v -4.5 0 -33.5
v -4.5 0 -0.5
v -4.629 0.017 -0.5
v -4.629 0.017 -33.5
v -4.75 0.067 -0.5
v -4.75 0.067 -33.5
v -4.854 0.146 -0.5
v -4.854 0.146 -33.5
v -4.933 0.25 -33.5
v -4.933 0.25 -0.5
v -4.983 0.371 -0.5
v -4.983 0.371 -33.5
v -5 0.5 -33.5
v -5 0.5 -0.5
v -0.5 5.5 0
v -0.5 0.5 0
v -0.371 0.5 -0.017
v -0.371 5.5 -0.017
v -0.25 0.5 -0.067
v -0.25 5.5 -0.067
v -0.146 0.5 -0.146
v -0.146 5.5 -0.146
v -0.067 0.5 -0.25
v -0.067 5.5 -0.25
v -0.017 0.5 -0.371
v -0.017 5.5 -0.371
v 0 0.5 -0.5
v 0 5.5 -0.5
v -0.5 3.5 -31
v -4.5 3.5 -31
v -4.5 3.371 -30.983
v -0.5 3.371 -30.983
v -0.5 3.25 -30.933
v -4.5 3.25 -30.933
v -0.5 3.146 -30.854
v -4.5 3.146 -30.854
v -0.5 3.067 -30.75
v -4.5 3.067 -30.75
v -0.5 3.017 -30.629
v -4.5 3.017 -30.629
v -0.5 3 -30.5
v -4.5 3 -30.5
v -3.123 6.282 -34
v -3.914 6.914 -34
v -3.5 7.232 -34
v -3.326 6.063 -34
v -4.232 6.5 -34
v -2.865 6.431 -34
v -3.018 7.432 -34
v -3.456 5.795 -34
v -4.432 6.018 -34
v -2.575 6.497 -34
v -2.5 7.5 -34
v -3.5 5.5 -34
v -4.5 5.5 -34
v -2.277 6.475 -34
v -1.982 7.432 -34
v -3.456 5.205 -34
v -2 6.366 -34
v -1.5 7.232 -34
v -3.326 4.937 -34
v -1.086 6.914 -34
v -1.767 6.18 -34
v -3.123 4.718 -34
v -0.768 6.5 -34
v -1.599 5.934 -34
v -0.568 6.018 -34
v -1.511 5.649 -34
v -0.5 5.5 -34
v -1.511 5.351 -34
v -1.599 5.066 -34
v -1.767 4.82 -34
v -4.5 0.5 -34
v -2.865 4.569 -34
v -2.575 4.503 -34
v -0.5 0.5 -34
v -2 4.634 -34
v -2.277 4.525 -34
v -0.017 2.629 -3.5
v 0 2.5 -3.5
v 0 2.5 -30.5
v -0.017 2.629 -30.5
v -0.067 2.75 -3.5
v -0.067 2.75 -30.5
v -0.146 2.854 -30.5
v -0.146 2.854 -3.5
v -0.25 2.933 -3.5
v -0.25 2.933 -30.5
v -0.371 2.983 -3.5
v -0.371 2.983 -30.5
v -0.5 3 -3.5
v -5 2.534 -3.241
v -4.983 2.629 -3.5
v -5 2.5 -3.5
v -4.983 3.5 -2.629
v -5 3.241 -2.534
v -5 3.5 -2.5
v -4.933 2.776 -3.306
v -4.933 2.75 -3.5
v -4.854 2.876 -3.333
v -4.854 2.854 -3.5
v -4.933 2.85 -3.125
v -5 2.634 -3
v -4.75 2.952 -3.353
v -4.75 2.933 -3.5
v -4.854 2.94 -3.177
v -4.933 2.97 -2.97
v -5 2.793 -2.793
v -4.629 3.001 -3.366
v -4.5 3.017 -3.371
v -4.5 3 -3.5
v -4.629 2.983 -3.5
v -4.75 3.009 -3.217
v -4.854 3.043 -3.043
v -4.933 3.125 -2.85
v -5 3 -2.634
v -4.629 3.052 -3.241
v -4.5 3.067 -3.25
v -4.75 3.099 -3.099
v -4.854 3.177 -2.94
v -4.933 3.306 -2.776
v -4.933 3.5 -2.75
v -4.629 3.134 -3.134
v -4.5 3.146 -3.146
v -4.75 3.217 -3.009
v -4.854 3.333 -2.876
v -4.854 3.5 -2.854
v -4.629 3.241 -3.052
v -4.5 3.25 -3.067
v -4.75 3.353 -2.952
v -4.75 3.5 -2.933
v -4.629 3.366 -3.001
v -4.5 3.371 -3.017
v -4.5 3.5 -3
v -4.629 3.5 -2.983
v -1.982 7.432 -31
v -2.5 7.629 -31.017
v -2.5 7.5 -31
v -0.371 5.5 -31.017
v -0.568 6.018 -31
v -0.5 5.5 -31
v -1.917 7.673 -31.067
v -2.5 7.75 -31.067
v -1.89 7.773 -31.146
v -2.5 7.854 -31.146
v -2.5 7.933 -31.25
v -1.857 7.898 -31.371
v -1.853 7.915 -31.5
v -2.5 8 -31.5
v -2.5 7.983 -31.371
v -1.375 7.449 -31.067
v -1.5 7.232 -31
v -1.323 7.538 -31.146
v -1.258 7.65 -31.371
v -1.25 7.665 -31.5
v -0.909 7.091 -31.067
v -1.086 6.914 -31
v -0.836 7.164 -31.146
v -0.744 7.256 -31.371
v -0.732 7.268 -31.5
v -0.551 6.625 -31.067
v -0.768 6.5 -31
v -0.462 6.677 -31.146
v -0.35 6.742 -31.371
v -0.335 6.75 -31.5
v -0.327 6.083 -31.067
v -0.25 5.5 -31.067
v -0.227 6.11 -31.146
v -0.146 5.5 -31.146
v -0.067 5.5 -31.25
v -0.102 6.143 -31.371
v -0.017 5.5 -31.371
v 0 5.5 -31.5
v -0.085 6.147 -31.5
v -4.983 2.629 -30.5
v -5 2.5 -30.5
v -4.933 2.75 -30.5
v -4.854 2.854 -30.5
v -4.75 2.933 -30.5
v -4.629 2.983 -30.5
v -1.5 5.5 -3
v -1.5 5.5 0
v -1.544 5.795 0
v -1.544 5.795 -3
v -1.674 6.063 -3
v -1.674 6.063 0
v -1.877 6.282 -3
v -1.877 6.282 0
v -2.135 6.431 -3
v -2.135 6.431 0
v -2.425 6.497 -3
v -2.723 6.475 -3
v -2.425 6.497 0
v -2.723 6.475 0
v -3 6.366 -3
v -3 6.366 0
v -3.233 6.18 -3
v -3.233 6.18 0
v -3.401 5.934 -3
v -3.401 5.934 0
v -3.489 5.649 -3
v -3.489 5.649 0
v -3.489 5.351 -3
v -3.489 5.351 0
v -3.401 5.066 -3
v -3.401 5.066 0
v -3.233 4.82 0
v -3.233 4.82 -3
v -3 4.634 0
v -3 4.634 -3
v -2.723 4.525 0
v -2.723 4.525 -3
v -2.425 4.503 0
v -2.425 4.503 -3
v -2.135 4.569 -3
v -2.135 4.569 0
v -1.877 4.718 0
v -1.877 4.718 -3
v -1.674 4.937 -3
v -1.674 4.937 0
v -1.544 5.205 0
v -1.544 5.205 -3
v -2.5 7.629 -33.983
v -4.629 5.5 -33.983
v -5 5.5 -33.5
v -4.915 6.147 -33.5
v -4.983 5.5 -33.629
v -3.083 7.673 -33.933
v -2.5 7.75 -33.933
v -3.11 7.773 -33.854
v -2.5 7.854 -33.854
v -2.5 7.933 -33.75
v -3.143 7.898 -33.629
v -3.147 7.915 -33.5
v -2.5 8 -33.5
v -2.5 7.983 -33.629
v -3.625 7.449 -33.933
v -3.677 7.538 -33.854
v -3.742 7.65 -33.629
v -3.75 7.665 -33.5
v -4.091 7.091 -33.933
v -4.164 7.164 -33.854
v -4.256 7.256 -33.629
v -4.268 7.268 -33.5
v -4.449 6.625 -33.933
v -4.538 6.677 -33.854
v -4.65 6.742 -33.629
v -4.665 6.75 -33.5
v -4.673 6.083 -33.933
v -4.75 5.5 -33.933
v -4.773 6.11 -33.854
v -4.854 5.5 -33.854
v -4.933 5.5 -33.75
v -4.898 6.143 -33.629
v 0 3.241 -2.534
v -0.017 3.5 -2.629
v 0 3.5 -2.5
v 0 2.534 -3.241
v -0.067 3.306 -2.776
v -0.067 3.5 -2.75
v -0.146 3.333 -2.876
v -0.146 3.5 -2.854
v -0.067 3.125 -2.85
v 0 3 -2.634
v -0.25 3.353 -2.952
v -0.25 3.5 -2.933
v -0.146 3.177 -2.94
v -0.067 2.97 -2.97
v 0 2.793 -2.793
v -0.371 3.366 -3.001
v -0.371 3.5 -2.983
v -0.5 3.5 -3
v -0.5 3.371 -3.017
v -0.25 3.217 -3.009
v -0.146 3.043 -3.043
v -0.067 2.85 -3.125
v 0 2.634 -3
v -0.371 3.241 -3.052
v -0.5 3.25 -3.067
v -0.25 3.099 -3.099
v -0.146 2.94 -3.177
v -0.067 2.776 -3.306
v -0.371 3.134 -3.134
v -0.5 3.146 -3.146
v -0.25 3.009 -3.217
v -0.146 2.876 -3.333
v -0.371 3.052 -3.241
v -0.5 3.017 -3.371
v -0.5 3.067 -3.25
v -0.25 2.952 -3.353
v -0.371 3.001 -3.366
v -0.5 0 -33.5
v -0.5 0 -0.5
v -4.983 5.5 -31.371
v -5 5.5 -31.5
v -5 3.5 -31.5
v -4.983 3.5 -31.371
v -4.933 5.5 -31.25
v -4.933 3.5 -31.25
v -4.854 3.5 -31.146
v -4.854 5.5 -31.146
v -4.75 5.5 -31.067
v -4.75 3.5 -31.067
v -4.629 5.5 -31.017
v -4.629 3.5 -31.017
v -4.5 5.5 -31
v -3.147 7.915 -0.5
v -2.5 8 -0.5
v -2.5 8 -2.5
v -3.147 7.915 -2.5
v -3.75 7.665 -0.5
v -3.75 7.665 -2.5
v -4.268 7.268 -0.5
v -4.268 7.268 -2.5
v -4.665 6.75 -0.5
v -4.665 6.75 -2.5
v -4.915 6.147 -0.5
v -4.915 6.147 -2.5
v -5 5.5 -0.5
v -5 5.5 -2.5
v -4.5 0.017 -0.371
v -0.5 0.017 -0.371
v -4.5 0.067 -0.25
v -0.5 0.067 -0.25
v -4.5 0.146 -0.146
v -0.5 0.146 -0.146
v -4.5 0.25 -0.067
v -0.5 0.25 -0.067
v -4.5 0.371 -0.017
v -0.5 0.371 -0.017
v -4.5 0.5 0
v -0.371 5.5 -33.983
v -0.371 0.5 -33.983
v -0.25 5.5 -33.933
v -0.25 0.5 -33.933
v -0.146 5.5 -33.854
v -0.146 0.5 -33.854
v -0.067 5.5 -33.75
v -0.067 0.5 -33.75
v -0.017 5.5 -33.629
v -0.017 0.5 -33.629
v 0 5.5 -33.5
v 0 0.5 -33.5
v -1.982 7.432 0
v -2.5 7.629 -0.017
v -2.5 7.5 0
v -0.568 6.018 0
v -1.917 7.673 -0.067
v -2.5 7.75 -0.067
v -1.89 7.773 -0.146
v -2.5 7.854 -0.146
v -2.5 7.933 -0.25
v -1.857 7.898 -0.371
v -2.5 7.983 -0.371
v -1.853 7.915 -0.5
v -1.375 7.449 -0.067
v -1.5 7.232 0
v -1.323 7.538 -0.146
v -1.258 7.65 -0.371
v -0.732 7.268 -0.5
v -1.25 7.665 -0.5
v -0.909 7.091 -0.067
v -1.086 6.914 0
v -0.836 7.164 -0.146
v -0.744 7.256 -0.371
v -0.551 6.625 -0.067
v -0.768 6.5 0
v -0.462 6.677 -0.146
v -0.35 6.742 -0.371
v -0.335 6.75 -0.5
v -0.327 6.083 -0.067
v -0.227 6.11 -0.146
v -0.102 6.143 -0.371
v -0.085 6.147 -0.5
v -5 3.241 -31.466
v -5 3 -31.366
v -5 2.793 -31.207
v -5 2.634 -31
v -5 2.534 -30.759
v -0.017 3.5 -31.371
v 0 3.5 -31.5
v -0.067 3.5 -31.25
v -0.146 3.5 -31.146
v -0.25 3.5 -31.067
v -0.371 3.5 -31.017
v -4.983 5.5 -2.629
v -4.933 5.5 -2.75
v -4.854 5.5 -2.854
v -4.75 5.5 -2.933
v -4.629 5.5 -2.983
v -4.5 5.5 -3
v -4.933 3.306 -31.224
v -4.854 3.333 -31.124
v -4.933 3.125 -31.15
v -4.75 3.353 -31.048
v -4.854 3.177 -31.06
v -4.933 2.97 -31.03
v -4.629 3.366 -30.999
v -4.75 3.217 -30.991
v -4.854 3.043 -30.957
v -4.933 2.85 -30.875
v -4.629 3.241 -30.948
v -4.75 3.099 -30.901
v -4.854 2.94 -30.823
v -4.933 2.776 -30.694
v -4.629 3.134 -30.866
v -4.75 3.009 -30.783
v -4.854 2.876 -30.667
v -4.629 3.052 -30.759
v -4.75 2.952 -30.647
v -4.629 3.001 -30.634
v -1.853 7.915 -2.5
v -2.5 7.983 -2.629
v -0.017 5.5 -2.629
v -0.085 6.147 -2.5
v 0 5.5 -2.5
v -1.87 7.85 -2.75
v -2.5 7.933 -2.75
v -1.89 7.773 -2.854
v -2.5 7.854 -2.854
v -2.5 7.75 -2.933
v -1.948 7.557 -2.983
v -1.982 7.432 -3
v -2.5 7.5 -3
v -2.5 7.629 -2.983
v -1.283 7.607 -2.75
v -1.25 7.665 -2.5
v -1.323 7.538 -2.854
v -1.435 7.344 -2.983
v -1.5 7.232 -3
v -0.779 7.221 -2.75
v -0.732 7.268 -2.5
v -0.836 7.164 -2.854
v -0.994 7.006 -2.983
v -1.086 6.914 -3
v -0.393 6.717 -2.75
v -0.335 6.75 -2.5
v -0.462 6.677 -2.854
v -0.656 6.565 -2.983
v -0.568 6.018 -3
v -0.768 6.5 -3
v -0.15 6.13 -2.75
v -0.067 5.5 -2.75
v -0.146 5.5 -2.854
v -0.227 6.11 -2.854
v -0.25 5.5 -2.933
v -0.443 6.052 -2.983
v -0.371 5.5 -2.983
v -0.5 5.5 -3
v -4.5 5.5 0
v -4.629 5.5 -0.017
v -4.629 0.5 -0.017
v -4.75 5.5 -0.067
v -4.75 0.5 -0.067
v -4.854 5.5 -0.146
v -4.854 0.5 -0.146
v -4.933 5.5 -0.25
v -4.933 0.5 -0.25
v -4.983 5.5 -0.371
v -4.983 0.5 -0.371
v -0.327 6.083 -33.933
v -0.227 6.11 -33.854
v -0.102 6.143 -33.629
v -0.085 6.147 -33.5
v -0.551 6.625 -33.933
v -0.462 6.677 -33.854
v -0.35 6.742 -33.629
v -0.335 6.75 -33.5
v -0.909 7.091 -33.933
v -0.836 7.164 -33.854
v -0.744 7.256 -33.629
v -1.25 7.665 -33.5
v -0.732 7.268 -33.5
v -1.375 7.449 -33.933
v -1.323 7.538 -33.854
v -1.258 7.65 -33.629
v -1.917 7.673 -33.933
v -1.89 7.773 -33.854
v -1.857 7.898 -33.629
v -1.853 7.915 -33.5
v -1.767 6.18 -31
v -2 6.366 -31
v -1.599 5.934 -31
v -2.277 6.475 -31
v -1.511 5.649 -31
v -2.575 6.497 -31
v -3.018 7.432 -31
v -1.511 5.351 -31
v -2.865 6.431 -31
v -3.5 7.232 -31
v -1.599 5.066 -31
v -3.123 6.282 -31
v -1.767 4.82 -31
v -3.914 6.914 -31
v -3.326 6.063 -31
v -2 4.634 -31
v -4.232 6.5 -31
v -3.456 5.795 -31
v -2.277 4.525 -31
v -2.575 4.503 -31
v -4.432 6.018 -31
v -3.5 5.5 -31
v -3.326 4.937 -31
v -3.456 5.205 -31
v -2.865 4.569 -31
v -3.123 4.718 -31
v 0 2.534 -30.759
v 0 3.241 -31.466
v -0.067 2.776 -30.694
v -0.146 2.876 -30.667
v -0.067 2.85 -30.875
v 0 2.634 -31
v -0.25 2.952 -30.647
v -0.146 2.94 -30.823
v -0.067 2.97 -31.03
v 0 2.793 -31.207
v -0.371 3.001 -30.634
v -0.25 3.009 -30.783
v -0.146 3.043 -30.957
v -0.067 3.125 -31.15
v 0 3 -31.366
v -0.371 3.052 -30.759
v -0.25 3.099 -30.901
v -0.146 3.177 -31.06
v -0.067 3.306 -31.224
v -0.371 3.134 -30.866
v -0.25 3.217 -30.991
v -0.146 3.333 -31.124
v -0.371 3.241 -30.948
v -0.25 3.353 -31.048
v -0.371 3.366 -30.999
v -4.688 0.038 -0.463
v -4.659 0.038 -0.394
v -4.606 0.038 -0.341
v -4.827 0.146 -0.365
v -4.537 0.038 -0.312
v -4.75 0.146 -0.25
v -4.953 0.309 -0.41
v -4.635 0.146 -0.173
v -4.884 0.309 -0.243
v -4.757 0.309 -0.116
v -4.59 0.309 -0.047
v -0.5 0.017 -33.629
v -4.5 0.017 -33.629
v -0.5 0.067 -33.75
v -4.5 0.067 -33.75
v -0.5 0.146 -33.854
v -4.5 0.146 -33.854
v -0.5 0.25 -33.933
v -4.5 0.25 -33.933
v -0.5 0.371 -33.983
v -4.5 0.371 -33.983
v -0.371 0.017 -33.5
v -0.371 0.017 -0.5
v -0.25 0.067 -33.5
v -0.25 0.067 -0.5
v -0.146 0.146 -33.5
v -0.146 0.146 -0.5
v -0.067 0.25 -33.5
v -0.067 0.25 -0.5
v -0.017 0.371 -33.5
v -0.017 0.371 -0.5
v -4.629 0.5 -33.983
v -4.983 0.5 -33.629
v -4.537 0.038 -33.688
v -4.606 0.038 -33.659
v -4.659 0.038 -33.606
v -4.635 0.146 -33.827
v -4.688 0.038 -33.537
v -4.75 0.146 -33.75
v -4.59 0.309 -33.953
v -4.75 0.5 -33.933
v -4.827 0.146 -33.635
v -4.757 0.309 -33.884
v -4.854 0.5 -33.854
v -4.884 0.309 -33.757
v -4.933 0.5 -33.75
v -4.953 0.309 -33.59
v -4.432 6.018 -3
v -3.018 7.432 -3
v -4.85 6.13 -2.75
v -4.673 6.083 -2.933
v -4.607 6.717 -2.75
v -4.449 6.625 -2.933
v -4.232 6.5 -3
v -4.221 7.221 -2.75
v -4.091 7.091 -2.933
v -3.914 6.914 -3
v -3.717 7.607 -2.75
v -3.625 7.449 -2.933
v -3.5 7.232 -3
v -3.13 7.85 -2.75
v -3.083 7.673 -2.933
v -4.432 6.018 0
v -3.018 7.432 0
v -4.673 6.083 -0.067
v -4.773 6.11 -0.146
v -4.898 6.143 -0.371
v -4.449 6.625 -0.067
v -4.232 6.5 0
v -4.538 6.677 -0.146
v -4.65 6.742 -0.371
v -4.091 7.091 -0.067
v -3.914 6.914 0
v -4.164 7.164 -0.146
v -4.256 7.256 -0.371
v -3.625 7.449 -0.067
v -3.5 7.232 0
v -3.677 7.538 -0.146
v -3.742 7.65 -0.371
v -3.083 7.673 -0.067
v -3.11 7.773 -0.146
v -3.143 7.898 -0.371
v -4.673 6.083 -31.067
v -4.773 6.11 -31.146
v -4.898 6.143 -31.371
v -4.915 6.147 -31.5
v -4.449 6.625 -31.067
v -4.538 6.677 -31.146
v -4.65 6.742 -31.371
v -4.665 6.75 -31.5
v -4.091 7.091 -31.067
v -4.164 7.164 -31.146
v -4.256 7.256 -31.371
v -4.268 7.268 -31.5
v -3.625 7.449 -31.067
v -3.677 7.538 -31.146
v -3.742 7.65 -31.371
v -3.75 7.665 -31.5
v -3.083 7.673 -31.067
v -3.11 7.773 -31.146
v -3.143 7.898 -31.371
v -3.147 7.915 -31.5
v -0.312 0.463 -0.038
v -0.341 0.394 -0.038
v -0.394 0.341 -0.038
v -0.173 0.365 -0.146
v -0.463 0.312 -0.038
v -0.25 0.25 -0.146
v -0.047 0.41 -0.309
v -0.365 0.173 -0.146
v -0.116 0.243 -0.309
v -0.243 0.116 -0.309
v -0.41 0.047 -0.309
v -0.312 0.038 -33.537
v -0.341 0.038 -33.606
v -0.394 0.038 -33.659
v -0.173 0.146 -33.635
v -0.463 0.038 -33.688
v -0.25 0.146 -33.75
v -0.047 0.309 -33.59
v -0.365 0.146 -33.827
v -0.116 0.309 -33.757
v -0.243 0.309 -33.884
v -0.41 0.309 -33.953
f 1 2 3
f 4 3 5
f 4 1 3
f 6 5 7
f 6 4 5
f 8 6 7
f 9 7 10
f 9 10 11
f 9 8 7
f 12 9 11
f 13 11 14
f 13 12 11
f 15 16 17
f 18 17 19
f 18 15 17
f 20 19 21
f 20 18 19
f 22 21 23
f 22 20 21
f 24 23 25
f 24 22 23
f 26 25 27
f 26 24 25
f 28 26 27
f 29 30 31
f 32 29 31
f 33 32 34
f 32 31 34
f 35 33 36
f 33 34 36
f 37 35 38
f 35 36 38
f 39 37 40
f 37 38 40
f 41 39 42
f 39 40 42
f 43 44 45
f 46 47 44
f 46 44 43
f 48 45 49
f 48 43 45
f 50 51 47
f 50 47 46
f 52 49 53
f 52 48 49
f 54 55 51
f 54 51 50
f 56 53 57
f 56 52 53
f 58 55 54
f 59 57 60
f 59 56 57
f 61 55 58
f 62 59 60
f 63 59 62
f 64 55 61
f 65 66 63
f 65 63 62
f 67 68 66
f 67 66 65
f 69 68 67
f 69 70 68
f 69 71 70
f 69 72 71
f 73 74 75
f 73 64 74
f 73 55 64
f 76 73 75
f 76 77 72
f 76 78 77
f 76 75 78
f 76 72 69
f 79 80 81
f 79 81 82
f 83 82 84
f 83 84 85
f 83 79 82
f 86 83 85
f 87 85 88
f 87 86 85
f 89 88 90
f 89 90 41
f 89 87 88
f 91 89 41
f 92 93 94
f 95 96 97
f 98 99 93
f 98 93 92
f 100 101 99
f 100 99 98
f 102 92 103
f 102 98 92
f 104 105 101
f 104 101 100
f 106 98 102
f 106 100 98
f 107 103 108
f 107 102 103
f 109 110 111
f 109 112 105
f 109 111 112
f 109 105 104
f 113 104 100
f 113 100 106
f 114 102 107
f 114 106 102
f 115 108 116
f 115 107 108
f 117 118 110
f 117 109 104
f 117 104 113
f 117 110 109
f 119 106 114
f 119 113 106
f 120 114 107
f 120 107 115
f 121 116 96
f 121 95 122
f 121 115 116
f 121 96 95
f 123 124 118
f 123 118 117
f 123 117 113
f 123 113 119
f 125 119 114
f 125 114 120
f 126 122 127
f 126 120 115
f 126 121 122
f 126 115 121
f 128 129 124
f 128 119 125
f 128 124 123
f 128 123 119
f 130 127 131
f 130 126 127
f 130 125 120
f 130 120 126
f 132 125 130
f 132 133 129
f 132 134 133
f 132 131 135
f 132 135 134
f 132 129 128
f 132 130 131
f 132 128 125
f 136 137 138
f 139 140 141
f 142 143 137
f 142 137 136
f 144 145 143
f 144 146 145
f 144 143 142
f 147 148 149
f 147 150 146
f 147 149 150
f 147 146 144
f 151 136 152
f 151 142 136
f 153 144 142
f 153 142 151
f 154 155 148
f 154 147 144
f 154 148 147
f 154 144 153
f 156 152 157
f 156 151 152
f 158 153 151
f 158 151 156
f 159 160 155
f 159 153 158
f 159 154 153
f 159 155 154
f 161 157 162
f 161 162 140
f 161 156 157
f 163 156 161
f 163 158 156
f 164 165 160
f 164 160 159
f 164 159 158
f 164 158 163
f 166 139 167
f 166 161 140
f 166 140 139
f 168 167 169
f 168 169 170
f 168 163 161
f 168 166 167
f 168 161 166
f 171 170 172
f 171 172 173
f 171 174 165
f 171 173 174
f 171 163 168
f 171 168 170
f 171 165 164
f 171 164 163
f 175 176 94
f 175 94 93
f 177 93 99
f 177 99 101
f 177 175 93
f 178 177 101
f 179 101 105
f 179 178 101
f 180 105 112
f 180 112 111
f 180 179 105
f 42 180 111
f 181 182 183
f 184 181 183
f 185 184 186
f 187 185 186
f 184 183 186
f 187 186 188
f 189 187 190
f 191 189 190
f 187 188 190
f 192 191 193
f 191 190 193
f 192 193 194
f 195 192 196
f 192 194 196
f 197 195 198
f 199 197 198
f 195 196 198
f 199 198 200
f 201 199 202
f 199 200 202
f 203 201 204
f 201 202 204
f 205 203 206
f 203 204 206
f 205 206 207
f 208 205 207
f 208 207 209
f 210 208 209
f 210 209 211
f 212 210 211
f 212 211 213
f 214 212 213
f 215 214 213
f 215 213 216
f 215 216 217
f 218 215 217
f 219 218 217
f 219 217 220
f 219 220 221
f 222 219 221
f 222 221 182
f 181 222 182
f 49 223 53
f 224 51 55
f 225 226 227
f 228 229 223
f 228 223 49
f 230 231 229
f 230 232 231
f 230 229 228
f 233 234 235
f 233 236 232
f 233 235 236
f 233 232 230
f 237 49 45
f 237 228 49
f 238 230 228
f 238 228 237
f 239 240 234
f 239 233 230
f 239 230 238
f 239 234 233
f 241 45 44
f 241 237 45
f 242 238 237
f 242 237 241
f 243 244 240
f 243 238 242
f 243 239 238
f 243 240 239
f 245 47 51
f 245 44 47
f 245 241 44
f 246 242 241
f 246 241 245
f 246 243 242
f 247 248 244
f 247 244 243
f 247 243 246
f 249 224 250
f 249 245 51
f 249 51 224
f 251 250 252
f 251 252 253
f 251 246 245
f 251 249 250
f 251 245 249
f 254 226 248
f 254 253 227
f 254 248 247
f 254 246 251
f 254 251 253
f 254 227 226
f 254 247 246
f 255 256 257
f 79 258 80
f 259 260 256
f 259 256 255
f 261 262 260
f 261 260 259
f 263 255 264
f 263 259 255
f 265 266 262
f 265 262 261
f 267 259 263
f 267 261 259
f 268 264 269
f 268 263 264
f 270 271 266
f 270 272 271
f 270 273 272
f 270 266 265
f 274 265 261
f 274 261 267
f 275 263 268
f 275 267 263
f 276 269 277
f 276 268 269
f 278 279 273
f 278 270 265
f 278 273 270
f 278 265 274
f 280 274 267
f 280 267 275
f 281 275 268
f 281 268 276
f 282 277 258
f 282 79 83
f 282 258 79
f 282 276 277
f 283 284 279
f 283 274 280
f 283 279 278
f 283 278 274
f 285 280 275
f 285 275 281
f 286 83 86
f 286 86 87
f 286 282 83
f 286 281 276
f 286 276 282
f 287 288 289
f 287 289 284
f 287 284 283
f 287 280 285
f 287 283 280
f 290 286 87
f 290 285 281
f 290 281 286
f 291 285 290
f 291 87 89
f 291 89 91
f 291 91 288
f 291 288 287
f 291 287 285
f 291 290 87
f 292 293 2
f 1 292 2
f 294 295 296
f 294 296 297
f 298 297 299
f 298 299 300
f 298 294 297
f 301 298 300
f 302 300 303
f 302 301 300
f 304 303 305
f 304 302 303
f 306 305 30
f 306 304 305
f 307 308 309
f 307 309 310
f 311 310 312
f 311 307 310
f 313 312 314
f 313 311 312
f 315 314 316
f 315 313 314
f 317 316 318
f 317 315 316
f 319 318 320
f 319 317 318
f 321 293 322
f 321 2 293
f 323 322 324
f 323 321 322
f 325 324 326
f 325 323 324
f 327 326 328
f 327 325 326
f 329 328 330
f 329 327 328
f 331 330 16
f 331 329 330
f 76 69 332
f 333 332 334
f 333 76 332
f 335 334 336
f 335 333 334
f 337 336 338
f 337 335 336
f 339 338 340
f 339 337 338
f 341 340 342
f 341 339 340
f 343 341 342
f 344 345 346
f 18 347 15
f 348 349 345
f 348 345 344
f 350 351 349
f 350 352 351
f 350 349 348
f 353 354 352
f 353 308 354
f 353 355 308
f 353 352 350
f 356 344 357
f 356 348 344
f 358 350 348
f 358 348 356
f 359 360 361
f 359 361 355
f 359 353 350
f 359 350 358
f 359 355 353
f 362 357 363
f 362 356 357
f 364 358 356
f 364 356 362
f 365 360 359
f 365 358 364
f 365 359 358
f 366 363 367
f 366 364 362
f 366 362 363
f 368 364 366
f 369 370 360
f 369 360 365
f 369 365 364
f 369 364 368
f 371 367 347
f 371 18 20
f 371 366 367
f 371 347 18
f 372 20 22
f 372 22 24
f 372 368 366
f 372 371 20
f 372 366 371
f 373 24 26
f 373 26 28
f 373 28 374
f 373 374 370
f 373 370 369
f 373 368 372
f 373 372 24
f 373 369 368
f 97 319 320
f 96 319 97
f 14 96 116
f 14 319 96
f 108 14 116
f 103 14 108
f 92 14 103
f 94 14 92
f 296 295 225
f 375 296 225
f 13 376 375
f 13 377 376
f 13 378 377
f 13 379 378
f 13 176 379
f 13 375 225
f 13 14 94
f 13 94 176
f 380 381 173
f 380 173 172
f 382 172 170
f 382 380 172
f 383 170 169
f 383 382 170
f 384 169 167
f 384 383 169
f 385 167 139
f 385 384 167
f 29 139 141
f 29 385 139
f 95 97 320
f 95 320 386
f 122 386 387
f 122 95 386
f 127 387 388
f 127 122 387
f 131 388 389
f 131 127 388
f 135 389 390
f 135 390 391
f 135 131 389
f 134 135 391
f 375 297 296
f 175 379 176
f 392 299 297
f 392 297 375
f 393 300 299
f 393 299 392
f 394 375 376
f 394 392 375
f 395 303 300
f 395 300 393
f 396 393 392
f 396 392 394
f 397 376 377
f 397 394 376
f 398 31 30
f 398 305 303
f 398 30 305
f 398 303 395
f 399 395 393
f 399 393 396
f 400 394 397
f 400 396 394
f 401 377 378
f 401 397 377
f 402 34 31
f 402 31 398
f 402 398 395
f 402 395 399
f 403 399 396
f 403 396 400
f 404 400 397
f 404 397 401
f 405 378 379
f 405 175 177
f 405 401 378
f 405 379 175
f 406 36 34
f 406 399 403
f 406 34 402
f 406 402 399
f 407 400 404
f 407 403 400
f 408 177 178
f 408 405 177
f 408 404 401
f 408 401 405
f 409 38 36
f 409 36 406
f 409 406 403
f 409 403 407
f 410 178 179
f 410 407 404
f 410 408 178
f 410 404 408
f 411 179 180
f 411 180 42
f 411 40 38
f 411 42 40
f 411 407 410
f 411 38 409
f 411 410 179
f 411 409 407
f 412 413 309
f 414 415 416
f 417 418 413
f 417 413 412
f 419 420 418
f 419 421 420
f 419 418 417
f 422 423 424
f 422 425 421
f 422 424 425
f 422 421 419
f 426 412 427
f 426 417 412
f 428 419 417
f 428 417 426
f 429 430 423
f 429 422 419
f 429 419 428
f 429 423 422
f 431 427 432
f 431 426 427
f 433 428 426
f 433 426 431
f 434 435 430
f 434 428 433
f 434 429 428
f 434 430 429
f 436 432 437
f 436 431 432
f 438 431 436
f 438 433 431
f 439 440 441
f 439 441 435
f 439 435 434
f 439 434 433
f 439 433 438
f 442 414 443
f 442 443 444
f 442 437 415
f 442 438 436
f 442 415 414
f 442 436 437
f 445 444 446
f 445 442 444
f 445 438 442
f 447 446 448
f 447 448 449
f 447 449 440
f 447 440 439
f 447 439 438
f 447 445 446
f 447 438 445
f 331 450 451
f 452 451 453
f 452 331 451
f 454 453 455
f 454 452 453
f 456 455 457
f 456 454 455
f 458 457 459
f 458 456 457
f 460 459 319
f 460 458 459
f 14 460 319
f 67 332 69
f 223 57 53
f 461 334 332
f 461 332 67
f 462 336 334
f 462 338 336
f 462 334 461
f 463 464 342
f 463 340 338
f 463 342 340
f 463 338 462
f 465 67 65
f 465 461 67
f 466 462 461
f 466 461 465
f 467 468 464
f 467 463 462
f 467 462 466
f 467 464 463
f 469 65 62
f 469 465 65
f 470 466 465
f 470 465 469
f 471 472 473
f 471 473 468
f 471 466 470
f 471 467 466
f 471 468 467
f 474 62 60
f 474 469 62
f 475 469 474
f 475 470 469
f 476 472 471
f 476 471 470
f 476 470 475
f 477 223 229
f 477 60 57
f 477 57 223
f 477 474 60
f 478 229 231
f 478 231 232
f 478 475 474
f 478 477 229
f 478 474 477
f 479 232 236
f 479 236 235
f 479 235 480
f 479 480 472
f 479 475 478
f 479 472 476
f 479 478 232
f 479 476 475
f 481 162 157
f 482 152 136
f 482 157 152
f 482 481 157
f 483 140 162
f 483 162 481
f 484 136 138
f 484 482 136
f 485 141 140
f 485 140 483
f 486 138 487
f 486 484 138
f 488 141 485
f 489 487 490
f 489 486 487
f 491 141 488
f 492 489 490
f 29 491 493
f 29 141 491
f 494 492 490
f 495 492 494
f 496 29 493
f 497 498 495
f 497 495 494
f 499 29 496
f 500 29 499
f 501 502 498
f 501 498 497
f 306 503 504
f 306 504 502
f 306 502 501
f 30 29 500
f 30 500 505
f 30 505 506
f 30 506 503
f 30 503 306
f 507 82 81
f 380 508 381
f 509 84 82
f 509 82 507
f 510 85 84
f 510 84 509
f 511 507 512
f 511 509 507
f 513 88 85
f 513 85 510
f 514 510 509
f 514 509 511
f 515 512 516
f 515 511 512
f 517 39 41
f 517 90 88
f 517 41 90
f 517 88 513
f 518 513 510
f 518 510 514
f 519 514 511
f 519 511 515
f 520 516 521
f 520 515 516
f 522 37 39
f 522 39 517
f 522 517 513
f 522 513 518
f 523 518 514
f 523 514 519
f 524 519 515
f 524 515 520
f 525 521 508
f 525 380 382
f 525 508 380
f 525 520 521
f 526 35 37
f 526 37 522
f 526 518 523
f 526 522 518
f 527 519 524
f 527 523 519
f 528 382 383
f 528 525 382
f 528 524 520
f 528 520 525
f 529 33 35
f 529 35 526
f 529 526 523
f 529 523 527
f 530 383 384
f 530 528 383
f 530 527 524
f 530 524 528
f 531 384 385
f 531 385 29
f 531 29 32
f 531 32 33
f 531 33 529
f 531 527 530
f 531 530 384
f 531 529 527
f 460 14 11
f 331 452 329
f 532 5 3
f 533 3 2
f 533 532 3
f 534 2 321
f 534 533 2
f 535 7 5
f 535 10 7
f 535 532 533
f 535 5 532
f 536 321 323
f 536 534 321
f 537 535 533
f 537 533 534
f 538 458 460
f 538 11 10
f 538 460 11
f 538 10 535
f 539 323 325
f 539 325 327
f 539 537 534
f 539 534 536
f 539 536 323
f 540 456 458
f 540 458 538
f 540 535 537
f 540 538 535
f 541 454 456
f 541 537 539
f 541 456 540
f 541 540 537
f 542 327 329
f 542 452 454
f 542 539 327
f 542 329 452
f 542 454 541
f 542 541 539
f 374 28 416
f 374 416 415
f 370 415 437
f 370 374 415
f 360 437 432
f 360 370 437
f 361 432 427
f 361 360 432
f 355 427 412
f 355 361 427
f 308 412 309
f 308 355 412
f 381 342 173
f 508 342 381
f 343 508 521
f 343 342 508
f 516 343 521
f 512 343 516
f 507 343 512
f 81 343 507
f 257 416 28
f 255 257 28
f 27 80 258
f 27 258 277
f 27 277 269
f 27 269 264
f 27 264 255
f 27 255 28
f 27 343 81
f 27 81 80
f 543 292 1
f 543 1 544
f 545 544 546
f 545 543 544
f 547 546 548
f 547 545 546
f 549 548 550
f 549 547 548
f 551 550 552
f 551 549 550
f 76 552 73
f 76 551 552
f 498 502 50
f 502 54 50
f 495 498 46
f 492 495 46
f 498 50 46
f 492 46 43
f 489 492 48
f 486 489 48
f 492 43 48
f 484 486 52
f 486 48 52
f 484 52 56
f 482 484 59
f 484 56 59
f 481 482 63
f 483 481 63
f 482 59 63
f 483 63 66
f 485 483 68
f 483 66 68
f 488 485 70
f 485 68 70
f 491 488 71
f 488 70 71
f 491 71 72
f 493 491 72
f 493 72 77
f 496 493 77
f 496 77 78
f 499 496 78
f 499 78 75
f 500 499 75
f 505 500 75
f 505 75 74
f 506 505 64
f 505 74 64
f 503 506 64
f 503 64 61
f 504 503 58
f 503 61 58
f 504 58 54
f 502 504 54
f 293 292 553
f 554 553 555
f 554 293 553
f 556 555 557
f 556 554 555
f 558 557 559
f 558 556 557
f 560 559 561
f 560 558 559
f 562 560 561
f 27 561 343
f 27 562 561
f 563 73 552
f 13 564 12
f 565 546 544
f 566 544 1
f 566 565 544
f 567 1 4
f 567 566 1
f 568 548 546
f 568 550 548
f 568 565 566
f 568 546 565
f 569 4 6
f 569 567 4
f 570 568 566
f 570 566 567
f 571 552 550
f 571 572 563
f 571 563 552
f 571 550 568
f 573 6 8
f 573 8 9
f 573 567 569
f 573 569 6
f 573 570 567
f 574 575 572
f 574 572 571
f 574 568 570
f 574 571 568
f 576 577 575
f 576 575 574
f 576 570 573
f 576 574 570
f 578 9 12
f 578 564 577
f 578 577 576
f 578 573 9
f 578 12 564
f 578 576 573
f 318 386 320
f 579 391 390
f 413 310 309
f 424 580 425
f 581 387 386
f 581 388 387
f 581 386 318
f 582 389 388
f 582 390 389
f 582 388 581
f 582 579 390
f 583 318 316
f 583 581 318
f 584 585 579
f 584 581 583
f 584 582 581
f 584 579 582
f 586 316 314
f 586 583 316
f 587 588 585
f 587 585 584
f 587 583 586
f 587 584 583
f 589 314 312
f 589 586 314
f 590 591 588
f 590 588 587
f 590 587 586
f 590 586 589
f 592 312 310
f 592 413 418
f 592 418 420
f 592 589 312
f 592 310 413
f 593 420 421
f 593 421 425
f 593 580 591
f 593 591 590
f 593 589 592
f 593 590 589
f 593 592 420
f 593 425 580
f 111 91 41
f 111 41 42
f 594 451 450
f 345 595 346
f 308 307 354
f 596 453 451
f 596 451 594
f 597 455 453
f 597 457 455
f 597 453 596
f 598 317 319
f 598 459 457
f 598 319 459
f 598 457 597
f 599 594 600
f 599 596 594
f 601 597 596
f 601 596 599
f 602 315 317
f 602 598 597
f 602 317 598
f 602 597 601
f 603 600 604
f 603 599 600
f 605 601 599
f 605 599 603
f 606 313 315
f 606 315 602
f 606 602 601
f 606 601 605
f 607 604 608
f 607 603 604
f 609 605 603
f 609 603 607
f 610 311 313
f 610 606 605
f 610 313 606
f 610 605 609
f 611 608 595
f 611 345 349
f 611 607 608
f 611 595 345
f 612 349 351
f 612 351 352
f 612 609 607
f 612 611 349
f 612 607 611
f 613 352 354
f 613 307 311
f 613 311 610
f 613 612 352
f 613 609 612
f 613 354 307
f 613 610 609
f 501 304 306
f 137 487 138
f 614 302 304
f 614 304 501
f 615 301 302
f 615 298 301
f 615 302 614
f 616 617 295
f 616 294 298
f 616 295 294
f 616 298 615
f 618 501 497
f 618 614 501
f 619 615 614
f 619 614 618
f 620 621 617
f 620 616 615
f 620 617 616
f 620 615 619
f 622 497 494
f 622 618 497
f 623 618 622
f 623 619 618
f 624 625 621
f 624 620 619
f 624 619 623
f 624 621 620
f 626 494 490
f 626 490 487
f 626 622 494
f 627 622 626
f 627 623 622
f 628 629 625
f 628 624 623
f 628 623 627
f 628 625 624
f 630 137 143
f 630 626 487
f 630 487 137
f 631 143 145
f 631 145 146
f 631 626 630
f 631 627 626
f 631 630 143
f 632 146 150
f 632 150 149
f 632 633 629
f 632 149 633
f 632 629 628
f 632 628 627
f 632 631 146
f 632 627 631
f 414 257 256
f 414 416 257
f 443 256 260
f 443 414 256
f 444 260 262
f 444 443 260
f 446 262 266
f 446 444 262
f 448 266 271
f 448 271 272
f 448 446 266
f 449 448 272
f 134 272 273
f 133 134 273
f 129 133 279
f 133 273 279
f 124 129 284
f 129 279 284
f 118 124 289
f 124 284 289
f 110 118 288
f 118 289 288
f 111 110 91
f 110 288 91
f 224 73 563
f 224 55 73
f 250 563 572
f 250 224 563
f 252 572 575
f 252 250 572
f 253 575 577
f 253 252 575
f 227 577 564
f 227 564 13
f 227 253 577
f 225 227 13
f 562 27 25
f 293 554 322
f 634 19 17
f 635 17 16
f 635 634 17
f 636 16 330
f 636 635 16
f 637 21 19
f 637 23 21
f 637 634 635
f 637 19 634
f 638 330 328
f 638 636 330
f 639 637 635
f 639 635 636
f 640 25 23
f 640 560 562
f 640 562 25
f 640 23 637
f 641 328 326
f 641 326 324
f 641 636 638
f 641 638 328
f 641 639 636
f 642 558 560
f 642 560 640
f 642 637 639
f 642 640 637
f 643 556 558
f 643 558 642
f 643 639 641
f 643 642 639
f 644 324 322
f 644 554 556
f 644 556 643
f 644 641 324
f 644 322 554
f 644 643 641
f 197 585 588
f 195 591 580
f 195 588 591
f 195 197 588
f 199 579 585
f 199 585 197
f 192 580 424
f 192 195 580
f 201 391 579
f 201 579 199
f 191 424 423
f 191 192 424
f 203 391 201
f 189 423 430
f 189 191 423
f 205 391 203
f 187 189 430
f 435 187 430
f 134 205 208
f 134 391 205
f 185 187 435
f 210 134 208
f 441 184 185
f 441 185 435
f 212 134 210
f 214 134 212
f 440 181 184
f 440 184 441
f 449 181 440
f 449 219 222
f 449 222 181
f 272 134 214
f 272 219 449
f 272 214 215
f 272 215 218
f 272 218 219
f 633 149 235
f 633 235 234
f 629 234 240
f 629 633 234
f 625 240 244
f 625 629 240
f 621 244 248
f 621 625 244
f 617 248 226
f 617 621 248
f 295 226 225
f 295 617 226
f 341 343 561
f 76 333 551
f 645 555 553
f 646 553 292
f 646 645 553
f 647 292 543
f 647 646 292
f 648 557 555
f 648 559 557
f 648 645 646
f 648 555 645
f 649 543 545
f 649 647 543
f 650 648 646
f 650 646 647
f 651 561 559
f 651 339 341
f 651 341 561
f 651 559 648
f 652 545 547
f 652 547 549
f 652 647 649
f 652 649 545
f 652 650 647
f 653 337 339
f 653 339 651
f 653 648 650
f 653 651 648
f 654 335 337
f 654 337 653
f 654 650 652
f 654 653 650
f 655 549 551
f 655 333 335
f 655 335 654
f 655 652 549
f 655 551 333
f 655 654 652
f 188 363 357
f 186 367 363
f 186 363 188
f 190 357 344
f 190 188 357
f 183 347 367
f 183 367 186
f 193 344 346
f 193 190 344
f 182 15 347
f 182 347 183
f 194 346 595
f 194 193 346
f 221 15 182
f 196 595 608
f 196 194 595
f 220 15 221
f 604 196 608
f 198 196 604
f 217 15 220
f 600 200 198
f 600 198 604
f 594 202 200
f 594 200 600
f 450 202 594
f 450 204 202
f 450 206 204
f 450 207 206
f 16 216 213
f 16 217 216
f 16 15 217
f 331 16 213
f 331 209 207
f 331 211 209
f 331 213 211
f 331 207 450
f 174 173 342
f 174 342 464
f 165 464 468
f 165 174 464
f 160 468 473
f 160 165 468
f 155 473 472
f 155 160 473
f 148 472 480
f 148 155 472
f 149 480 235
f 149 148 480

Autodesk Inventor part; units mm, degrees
ref_plane "YZ Plane" through (0, 0, 0) normal (1, 0, 0) x (0, 1, 0)
ref_plane "XZ Plane" through (0, 0, 0) normal (0, 1, 0) x (-1, 0, 0)
ref_plane "XY Plane" through (0, 0, 0) normal (0, 0, 1) x (1, 0, 0)
sketch "Sketch1" plane through (0, 0, 0) normal (0, 1, 0) x (-1, 0, 0)
  line L0 (0, 0) -> (5, 0)
  line L1 (5, 0) -> (5, -34)
  line L2 (5, -34) -> (0, -34)
  line L3 (0, -34) -> (0, 0)
  dimension "d0" = 5
  dimension "d1" = 34
extrude "Extrusion1" add sketch "Sketch1" along normal blind 3
sketch "Sketch2" plane through (0, 3, 0) normal (0, 1, 0) x (1, 0, 0)
  line L0 (-5, 0) -> (0, 0) projected
  line L1 (-5, 34) -> (-5, 0) projected
  line L2 (0, 0) -> (-5, 0)
  line L3 (-5, 0) -> (-5, 3)
  line L4 (-5, 3) -> (0, 3)
  line L5 (0, 3) -> (0, 0)
  line L6 (0, 34) -> (-5, 34) projected
  line L7 (-5, 34) -> (0, 34)
  line L8 (0, 34) -> (0, 31)
  line L9 (0, 31) -> (-5, 31)
  line L10 (-5, 31) -> (-5, 34)
  dimension "d4" = 3
  dimension "d5" = 5
  dimension "d6" = 3
extrude "Extrusion2" add sketch "Sketch2" along normal blind 5
fillet "Fillet1" radius 2.5 4 edges at (0, 8, -1.5) (-5, 8, -1.5) (-5, 8, -32.5) (0, 8, -32.5)
sketch "Sketch3" plane through (-5, 3, -31) normal (0, 0, 1) x (1, 0, 0)
  point P0 (5, -3)
sketch "Sketch4" plane through (-5, 0, 0) normal (0, 0, 1) x (1, 0, 0)
  circle A0 centre (2.5, 5.5) radius 1
  arc A1 (5, 5.5) -> (0, 5.5) centre (2.5, 5.5) ccw projected
  line L0 (5, 0) -> (5, 5.5) projected
  dimension "d10" = 2
  dimension "d11" = 0
  dimension "d12" = 2.5
sketch "Sketch5" plane through (0, 0, -34) normal (0, 0, -1) x (-1, 0, 0)
  circle A0 centre (2.5, 5.5) radius 1
  arc A1 (5, 5.5) -> (0, 5.5) centre (2.5, 5.5) ccw projected
  line L0 (5, 0) -> (5, 5.5) projected
  point P0 (0, 0)
  dimension "d13" = 2
  dimension "d14" = 0
  dimension "d15" = 2.5
extrude "Extrusion3" cut sketch "Sketch5" against normal blind 3
extrude "Extrusion4" cut sketch "Sketch4" against normal blind 3
fillet "Fillet2" radius 0.5 20 edges at (-4.2679, 7.2679, -34) (-5, 2.7503, -34) (0, 2.7503, -34) (-4.2679, 7.2679, -31) (-5, 4.2503, -31) (0, 4.2503, -31) (0, 3, -17) (0, 0, -17) (-2.5, 0, -34) (-0.7321, 7.2679, -3) (-5, 4.2503, -3) (0, 4.2503, -3) (-0.7321, 7.2679, 0) (-5, 2.7503, 0) (0, 2.7503, 0) (-2.5, 3, -3) (-5, 3, -17) (-5, 0, -17) (-2.5, 0, 0) (-2.5, 3, -31)
properties part number "support"
